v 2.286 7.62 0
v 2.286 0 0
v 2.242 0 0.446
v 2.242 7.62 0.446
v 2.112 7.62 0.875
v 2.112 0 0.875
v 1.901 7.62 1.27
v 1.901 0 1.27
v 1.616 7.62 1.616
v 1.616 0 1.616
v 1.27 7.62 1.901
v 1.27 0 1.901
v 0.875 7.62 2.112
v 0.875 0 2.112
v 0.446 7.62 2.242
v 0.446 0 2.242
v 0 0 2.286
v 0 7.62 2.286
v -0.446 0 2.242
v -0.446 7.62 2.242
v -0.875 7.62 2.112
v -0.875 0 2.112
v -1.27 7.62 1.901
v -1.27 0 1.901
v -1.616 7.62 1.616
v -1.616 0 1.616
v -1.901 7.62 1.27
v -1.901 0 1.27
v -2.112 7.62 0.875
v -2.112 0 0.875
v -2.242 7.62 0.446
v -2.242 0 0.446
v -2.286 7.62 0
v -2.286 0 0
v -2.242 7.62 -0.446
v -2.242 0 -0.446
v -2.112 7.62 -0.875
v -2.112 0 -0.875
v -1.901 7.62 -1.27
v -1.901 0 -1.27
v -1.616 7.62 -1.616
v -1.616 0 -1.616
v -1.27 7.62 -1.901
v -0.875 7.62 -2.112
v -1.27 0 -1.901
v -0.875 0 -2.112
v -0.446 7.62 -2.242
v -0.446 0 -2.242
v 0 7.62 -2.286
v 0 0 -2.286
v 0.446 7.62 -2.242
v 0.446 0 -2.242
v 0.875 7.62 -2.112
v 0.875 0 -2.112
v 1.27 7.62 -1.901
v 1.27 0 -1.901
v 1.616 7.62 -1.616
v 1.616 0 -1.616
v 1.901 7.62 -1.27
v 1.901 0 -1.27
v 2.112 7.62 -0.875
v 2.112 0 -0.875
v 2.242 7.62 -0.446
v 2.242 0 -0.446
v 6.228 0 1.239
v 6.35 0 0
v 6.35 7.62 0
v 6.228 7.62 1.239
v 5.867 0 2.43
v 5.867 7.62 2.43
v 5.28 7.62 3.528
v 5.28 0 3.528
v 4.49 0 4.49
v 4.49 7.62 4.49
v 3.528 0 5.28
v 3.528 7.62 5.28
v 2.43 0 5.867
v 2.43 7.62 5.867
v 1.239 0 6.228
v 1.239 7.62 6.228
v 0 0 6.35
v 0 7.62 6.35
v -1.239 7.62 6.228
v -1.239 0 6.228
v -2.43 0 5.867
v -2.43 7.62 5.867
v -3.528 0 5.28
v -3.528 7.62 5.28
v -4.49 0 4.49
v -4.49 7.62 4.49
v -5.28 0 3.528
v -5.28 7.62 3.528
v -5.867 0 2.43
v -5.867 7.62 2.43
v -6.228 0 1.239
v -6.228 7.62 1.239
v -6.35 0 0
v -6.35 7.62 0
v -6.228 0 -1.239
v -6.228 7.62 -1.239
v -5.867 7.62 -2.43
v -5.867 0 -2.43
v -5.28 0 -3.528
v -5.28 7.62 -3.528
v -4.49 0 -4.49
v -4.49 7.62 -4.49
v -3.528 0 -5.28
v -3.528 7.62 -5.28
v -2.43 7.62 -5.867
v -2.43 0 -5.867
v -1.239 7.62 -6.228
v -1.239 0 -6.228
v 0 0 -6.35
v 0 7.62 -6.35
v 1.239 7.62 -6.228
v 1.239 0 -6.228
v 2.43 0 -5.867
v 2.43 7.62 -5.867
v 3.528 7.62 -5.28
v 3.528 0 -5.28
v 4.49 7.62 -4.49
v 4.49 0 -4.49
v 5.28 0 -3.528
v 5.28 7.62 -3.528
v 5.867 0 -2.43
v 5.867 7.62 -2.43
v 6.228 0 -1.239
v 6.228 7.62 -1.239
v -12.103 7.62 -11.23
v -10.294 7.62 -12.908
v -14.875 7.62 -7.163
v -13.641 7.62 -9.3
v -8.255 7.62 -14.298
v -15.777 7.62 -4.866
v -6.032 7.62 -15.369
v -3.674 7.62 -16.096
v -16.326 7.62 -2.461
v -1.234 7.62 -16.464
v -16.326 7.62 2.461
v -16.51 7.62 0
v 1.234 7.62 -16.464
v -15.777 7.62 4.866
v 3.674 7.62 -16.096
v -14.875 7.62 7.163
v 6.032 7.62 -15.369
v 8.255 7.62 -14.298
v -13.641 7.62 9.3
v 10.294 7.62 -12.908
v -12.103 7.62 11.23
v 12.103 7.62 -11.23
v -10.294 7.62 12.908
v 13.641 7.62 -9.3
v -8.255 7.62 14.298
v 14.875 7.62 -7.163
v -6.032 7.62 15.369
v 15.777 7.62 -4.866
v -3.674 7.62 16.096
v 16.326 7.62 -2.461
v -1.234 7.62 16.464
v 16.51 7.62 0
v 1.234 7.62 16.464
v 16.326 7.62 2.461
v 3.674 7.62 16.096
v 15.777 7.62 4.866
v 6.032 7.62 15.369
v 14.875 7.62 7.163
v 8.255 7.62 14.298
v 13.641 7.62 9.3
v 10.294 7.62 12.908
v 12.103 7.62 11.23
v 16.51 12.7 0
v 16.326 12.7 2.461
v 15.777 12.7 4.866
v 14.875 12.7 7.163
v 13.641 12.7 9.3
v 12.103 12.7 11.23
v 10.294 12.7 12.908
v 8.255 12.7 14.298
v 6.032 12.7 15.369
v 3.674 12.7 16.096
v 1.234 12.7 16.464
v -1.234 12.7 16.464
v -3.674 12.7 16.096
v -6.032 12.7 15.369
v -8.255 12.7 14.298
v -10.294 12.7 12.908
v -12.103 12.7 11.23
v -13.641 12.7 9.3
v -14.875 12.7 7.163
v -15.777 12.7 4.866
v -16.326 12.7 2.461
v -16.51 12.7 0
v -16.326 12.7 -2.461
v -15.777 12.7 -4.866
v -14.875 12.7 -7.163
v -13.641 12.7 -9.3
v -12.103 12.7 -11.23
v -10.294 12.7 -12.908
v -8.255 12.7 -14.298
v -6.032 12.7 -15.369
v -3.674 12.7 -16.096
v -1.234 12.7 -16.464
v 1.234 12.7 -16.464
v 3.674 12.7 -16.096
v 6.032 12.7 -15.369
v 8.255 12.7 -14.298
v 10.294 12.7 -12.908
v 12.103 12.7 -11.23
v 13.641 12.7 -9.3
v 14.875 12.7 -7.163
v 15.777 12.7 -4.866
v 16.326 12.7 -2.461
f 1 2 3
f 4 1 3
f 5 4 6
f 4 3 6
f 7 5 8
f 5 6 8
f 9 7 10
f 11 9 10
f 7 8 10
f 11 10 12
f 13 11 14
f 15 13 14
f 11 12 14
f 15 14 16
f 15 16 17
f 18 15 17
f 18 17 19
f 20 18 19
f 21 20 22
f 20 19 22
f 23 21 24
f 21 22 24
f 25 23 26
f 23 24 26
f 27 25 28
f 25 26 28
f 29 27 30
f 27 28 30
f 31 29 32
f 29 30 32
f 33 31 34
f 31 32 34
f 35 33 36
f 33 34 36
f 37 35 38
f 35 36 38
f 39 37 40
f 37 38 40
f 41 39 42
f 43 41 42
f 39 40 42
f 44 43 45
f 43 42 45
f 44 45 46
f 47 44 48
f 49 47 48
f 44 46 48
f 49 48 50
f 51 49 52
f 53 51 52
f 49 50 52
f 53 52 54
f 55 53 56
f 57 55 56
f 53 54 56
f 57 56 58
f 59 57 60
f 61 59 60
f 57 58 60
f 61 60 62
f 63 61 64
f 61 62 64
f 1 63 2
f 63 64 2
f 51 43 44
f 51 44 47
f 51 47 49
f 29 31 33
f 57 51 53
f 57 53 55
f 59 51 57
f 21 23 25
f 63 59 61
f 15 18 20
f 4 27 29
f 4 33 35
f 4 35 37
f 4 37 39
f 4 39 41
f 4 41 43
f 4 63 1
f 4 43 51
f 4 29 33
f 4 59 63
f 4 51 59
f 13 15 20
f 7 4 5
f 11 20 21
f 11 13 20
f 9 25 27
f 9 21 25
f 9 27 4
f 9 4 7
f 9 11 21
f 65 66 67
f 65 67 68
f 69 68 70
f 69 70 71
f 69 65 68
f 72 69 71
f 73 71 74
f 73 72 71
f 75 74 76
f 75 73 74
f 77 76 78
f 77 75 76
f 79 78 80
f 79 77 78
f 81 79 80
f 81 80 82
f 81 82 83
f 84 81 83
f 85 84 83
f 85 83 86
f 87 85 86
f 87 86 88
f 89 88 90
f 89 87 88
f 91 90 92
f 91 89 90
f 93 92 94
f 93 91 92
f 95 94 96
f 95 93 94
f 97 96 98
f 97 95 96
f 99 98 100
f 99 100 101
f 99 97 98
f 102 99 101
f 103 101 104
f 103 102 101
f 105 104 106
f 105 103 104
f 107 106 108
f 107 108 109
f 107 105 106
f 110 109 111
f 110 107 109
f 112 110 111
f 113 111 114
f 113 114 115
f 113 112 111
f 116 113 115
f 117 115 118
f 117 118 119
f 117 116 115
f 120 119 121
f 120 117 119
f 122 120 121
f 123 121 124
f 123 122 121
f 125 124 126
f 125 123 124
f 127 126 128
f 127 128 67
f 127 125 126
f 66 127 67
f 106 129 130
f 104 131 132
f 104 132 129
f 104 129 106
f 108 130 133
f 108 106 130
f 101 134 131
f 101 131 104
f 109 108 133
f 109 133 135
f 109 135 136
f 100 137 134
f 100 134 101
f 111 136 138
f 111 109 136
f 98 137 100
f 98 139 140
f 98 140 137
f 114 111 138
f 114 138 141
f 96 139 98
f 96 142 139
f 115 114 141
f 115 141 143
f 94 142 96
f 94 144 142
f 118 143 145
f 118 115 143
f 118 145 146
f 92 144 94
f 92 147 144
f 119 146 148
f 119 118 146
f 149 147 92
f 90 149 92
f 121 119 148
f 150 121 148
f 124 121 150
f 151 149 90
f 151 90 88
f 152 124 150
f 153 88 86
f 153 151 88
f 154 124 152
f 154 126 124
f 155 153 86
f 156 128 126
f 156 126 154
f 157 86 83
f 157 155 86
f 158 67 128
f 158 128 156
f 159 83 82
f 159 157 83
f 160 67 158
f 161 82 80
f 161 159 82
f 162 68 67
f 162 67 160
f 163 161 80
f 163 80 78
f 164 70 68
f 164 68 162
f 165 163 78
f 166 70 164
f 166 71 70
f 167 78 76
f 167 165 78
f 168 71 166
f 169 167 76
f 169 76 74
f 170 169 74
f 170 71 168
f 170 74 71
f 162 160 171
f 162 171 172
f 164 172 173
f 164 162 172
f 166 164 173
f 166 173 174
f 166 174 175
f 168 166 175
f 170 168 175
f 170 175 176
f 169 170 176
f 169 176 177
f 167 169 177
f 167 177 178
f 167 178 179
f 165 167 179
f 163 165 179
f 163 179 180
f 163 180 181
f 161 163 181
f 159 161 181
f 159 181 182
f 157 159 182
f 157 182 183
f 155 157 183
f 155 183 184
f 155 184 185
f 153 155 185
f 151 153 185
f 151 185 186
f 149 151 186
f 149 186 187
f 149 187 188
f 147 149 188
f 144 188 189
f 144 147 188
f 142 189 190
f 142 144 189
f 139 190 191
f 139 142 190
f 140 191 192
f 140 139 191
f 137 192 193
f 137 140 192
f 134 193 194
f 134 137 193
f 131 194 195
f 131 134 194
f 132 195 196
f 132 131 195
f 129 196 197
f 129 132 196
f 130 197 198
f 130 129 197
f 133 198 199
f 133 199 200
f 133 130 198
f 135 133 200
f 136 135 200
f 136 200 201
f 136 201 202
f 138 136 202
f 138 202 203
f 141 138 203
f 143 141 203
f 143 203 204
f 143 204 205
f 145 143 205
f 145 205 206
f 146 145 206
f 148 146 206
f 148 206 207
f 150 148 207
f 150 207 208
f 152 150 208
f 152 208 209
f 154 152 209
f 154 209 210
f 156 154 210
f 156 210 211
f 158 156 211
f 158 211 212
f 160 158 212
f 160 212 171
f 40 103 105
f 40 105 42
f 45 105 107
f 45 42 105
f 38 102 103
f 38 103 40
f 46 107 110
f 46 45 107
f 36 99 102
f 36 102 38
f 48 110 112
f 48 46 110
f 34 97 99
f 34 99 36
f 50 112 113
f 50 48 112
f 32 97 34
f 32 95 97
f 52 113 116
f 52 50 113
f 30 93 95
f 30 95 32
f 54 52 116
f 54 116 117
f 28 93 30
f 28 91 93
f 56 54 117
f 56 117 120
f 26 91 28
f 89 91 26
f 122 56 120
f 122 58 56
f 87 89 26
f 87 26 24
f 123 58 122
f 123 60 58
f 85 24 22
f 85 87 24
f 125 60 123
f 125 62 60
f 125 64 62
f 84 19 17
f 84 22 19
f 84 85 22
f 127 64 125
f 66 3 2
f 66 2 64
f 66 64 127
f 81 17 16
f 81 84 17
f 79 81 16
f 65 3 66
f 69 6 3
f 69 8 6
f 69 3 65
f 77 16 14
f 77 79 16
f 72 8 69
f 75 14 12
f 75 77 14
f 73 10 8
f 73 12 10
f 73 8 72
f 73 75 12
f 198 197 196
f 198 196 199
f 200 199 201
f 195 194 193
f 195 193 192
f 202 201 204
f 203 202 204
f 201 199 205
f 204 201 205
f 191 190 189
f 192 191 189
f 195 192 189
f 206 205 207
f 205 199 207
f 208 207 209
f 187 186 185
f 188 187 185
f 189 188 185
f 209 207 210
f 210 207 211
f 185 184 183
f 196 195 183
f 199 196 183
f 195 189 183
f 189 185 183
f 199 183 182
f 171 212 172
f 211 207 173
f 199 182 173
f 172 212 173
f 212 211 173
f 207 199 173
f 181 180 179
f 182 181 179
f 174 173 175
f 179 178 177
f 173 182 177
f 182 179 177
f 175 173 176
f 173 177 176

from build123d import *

# Parameters (mm, degrees)
F0_R     = 16.51
F1_DEPTH = 12.7
F2_R     = 2.286
F3_DEPTH = 7.62
F4_R     = 16.51
F4_R_2   = 6.35
F5_DEPTH = 7.62


with BuildPart() as f1:
    # F0 (on Front) → F1 (new body)
    with BuildSketch(Plane.XZ):
        Circle(F0_R)
    extrude(amount=-F1_DEPTH)

    # F2 (on face) → F3 (cut)
    with BuildSketch(Plane.XZ):
        Circle(F2_R)
    extrude(amount=-F3_DEPTH, mode=Mode.SUBTRACT)

    # F4 (on face) → F5 (cut)
    with BuildSketch(Plane.XZ):
        Circle(F4_R)
        Circle(F4_R_2, mode=Mode.SUBTRACT)
    extrude(amount=-F5_DEPTH, mode=Mode.SUBTRACT)


solid = f1.part
